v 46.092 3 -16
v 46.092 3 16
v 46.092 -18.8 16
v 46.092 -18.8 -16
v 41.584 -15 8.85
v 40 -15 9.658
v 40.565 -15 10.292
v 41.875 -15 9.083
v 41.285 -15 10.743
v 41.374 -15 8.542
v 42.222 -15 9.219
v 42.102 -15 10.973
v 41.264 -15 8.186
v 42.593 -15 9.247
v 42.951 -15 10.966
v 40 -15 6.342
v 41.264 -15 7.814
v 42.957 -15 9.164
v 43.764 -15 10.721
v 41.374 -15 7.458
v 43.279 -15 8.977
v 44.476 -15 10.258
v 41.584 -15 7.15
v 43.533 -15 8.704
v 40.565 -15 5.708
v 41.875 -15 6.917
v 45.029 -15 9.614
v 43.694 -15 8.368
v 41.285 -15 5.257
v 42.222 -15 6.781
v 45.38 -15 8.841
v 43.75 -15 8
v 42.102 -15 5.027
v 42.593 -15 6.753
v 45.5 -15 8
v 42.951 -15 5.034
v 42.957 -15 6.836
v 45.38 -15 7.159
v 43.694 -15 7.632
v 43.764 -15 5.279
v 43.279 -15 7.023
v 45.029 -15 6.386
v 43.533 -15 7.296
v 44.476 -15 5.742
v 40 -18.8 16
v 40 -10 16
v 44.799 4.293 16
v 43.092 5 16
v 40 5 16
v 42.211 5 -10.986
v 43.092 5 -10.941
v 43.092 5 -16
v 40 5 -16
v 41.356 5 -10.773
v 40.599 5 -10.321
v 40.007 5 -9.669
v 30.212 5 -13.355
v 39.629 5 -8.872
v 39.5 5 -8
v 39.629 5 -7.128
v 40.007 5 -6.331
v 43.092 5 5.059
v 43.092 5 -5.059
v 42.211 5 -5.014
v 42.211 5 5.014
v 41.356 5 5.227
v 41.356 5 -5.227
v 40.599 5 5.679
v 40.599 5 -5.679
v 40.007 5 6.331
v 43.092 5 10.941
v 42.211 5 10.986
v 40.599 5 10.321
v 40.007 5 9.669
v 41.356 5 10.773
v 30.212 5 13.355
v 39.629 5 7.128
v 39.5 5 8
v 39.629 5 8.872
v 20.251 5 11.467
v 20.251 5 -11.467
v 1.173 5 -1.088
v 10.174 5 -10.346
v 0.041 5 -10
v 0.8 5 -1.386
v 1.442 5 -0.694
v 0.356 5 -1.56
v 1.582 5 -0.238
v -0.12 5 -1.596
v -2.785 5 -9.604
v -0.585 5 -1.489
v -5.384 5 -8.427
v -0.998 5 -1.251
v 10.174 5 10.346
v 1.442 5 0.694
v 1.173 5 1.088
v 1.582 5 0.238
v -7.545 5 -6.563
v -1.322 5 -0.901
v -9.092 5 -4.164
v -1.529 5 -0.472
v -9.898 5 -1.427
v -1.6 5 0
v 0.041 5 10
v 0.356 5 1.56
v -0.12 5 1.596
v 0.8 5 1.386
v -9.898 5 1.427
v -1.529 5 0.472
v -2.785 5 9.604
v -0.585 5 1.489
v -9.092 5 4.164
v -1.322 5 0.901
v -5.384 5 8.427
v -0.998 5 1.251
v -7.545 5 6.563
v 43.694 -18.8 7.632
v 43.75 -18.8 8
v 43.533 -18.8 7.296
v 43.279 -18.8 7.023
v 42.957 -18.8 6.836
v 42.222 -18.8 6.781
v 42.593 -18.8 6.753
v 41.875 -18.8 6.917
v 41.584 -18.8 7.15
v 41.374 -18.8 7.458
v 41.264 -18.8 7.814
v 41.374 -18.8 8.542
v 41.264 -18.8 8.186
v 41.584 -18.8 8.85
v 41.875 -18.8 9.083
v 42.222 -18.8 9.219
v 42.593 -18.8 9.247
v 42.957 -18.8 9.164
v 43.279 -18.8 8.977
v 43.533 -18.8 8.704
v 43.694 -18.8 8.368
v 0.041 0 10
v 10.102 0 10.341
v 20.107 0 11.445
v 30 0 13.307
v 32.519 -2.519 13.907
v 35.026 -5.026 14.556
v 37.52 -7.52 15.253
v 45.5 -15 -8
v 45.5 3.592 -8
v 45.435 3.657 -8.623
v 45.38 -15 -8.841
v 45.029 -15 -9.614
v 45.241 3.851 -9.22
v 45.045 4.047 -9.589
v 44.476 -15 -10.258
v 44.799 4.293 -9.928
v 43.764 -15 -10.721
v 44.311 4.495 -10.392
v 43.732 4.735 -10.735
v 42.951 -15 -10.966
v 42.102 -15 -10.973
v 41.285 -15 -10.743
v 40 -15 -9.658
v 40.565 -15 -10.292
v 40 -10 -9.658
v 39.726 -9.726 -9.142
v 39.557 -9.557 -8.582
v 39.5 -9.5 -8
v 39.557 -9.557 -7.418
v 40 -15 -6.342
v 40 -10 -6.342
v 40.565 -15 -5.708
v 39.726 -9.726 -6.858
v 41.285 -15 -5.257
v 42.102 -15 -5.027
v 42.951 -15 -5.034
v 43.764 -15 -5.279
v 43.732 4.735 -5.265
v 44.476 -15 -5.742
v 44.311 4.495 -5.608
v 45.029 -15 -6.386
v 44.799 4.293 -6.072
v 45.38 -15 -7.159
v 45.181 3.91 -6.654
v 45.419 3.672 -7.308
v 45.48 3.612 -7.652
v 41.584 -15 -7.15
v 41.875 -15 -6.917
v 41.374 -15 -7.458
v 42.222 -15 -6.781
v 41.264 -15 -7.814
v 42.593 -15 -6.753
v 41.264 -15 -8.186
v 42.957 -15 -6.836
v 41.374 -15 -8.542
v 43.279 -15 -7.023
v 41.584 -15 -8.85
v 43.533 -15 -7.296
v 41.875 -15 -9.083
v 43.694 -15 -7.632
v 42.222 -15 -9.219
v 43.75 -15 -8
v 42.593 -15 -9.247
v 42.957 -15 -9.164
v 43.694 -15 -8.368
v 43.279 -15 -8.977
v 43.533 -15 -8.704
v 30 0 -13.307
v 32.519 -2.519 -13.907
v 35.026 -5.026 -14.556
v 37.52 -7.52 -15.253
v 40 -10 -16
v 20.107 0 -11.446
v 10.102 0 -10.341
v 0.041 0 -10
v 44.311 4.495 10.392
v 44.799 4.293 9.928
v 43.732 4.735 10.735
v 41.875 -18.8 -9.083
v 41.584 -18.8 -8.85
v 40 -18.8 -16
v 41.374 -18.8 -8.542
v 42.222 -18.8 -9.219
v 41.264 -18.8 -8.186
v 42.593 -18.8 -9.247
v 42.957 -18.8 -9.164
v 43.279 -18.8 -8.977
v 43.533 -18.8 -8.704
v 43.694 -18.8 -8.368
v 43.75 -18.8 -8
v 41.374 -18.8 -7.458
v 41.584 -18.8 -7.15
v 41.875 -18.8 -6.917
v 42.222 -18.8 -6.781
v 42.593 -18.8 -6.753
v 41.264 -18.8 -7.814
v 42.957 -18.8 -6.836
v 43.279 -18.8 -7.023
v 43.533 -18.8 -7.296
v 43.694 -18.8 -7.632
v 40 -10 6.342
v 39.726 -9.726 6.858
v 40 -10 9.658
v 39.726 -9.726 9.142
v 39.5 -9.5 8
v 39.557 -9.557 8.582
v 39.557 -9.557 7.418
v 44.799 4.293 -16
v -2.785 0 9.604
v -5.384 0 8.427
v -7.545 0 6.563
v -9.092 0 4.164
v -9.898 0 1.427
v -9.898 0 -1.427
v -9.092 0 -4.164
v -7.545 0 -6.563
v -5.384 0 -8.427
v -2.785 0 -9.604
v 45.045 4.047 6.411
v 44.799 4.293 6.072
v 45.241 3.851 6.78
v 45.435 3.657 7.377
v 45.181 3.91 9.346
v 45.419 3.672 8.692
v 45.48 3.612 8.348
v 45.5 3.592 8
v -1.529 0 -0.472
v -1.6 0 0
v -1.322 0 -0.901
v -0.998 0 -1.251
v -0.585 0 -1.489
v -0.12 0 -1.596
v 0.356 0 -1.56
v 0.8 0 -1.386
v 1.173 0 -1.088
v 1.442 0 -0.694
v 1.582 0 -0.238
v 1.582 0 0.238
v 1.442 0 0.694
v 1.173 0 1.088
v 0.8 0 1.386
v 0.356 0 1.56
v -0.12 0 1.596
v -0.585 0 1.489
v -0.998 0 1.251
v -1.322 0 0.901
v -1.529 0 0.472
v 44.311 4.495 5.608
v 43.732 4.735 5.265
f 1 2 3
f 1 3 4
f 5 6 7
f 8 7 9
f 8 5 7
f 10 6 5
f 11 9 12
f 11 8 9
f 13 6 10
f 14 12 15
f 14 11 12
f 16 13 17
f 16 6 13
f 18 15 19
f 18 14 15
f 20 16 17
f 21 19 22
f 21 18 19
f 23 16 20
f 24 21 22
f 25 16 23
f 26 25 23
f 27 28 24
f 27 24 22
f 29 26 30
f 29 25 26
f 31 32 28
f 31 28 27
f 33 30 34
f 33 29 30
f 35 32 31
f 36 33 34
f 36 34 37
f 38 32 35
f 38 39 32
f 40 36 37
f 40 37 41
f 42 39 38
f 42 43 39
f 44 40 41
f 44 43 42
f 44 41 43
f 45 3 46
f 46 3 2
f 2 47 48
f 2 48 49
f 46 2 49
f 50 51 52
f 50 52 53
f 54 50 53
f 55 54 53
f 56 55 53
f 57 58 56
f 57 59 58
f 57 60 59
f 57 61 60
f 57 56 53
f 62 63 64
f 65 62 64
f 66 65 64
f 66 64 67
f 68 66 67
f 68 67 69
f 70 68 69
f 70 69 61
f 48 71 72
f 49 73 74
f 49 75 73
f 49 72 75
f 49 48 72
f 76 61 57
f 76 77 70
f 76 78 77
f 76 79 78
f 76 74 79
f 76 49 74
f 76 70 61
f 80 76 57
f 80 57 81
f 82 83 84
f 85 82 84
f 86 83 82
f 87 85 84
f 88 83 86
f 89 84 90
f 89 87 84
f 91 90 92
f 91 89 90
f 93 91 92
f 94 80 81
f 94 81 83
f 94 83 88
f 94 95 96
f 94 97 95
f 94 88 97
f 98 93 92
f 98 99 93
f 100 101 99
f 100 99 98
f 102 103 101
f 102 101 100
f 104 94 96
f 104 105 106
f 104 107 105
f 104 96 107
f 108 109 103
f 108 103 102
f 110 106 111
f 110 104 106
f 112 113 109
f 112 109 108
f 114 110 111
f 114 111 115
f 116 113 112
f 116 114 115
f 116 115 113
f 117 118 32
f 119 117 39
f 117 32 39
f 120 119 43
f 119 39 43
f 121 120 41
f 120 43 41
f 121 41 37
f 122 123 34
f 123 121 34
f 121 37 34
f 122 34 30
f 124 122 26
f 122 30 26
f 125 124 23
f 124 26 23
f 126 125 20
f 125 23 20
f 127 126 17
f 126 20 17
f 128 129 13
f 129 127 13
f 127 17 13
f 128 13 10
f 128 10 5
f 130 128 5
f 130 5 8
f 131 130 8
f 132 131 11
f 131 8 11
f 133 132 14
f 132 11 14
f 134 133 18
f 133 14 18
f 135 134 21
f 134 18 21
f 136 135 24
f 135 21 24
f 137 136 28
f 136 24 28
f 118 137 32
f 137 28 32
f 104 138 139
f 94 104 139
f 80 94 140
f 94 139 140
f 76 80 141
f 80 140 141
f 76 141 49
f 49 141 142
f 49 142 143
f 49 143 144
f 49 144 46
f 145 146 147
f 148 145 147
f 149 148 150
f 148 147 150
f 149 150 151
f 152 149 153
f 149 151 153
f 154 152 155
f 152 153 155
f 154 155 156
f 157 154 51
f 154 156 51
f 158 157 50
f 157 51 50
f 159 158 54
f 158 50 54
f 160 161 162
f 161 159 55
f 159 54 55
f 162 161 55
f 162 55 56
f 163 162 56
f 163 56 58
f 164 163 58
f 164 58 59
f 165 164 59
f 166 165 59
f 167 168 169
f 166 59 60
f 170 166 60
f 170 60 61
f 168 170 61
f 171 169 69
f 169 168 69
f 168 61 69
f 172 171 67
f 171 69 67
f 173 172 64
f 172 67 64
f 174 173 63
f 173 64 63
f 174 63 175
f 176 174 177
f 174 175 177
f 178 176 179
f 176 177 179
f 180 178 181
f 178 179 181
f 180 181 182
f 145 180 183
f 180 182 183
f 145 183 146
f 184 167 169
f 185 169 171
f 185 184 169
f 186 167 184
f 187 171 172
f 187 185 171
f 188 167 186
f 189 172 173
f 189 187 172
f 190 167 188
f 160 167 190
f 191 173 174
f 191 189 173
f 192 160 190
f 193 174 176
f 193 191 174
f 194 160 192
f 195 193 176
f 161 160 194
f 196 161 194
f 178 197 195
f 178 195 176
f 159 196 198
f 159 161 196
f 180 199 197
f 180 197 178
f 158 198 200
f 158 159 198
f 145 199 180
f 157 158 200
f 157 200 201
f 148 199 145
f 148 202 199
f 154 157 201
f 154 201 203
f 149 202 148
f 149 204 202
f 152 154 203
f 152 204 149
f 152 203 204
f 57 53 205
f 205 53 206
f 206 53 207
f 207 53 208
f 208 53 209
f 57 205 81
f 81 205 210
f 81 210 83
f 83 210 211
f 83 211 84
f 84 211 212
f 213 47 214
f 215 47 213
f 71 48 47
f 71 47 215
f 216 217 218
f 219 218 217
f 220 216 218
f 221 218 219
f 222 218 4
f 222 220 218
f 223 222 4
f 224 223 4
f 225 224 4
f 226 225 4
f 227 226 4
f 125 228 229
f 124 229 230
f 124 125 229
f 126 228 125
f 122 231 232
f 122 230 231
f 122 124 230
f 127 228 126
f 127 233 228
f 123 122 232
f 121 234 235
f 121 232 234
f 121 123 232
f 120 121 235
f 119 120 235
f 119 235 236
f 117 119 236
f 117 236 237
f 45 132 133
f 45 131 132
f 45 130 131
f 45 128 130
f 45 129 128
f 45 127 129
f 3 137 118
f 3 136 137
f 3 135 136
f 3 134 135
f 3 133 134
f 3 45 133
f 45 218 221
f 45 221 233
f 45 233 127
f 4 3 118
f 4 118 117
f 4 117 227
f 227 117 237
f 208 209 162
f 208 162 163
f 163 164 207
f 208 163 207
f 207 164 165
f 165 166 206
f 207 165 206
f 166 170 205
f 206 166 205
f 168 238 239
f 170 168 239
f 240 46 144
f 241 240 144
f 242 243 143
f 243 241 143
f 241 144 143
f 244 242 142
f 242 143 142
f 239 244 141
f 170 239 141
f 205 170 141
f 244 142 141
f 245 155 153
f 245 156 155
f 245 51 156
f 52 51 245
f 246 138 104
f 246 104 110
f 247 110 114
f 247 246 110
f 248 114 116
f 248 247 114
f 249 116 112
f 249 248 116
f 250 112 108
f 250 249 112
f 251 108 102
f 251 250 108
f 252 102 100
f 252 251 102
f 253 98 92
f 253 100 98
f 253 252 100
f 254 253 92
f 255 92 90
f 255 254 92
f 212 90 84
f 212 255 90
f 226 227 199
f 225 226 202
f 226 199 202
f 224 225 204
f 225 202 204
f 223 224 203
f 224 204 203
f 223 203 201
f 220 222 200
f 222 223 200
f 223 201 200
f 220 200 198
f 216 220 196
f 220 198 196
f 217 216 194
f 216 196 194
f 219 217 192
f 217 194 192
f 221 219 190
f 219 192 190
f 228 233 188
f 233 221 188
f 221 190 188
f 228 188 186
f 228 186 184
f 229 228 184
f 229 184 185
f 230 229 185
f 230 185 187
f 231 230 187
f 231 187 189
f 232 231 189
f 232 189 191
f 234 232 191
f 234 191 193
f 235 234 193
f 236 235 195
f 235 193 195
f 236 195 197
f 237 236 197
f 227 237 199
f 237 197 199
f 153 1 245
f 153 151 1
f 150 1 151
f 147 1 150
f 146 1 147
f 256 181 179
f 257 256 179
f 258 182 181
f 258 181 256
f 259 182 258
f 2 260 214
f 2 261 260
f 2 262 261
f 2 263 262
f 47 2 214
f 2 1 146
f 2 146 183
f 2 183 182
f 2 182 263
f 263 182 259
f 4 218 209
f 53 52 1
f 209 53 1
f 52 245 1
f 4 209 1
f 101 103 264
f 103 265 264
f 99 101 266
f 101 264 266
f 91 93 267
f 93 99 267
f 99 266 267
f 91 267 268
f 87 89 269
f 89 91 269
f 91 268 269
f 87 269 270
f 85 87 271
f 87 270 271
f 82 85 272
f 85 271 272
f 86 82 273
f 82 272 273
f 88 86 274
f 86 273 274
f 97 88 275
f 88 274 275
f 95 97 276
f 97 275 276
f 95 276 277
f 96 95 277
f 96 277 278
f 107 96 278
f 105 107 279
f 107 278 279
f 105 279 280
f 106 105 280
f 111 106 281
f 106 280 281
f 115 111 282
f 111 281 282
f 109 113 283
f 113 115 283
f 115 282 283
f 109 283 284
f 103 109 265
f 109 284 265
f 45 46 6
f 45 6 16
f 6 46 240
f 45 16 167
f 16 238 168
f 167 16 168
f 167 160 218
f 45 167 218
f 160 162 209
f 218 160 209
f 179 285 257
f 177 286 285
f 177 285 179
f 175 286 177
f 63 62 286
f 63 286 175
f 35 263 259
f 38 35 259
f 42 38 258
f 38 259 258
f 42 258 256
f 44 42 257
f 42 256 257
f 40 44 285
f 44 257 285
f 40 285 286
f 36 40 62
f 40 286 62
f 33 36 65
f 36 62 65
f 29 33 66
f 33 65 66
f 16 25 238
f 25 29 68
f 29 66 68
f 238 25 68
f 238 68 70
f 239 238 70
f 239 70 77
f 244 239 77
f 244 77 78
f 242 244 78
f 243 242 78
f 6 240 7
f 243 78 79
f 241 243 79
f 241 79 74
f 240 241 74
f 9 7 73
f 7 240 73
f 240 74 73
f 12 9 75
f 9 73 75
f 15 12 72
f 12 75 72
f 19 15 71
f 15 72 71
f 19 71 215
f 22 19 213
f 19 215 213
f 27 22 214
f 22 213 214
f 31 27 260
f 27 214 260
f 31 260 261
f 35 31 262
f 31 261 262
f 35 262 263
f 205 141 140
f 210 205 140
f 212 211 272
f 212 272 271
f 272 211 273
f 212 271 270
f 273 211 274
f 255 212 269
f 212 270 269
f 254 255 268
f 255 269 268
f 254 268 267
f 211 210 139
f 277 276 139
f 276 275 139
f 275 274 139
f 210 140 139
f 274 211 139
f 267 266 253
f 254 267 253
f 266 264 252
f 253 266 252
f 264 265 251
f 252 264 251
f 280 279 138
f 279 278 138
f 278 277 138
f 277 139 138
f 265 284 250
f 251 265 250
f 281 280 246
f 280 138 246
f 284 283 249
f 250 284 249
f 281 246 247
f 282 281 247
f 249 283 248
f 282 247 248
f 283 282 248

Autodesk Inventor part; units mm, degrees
ref_plane "YZ Plane" through (0, 0, 0) normal (1, 0, 0) x (0, 1, 0)
ref_plane "XZ Plane" through (0, 0, 0) normal (0, 1, 0) x (-1, 0, 0)
ref_plane "XY Plane" through (0, 0, 0) normal (0, 0, 1) x (1, 0, 0)
sketch "Эскиз1" plane through (0, 0, 0) normal (0, 1, 0) x (-1, 0, 0)
  circle A0 centre (0, 0) radius 1.6
  circle A1 centre (0, -0.0001) radius 5
  line L0 (-40, -6.3417) -> (-40, 6.3417)
  line L1 (-40, 16) -> (-46.0917, 16)
  line L2 (-46.0917, -16) -> (-40, -16)
  line L3 (-40, -16) -> (-40, -9.6583)
  line L4 (-40, -6.3417) -> (-40, -9.6583)
  line L5 (-40, 9.6583) -> (-40, 6.3417)
  line L6 (-40, 9.6583) -> (-40, 16)
  line L7 (-40, 16) -> (-46.0917, 16)
  line L8 (-46.0917, 16) -> (-46.0917, -16)
  line L9 (-46.0917, -16) -> (-40, -16)
  line L10 (-40, -16) -> (-40, 16)
  circle A2 centre (0, -0.0001) radius 10
  arc A3 (-40, 16) -> (-0.0411, 9.9998) centre (-0.586, 142.4269) ccw
  arc A4 (-0.0411, -10) -> (-40, -16) centre (-0.5865, -142.4271) ccw
  point P0 (0, 0)
  dimension "d0" = 20
  dimension "d1" = 132.4282
  dimension "d2" = 132.4282
extrude "Выдавливание1" add sketch "Эскиз1" along normal blind 5 contours A1 | L4 L3 L2 L8 L1 L6 L5 L0 | L0 L5 L6 A3 A2 A4 L3 L4 | A2
sketch "Эскиз2" plane through (0, 0, 0) normal (0, -1, 0) x (1, 0, 0)
  circle A0 centre (42.5, -8) radius 1.25 projected
  circle A1 centre (0, 0) radius 1.6 projected
  line L0 (46.0917, -16) -> (40, -16) projected
  line L1 (46.0917, 16) -> (46.0917, -16) projected
  line L2 (40, 16) -> (46.0917, 16) projected
  arc A2 (0.0411, 9.9998) -> (40, 16) centre (0.586, 142.4269) ccw projected
  arc A3 (0.0411, 9.9998) -> (0.0411, -10) centre (0, -0.0001) ccw projected
  arc A4 (40, -16) -> (0.0411, -10) centre (0.5865, -142.4271) ccw projected
  circle A5 centre (42.5, 8) radius 1.25 projected
  point P0 (0, 0)
extrude "Выдавливание2" cut sketch "Эскиз2" against normal blind 5 contours A0 | A5
sketch "Эскиз3" plane through (0, 0, 0) normal (0, -1, 0) x (1, 0, 0)
  line L0 (46.0917, 16) -> (46.0917, -16) projected
  arc A0 (40, -16) -> (0.0411, -10) centre (0.5865, -142.4271) ccw projected
  line L1 (46.0917, 16) -> (40, 16)
  line L2 (40, 16) -> (40, -16)
  line L3 (40, -16) -> (46.0917, -16)
  line L4 (46.0917, -16) -> (46.0917, 16)
  circle A1 centre (42.5, 8) radius 1.25 projected
  circle A2 centre (42.5, 8) radius 1.25
  circle A3 centre (42.5, -8) radius 1.25 projected
  circle A4 centre (42.5, -8) radius 1.25
  point P0 (0, 0)
extrude "Выдавливание3" add sketch "Эскиз3" along normal blind 18.8
chamfer "Фаска1" distance 10 angle 45 1 edges at (40, 0, 0)
sketch "Эскиз4" plane through (0, 5, 0) normal (0, 1, 0) x (1, 0, 0)
  circle A0 centre (42.5, -8) radius 1.25 projected
  circle A1 centre (42.5, -8) radius 3
  circle A2 centre (42.5, 8) radius 1.25 projected
  circle A3 centre (42.5, 8) radius 3
  point P0 (0, 0)
  dimension "d12" = 6
  dimension "d13" = 6
extrude "Выдавливание4" cut sketch "Эскиз4" against normal blind 20
chamfer "Фаска2" distance 2 angle 45 1 edges at (46.0917, 5, 0)
chamfer "Фаска3" distance 1 angle 45 3 edges at (44.0917, 5, 0) (44.0917, 5, 13.2715) (44.0917, 5, -13.2715)
equation "\"d2\" = d1"
properties part number "000.403 - Верхний рычаг"
